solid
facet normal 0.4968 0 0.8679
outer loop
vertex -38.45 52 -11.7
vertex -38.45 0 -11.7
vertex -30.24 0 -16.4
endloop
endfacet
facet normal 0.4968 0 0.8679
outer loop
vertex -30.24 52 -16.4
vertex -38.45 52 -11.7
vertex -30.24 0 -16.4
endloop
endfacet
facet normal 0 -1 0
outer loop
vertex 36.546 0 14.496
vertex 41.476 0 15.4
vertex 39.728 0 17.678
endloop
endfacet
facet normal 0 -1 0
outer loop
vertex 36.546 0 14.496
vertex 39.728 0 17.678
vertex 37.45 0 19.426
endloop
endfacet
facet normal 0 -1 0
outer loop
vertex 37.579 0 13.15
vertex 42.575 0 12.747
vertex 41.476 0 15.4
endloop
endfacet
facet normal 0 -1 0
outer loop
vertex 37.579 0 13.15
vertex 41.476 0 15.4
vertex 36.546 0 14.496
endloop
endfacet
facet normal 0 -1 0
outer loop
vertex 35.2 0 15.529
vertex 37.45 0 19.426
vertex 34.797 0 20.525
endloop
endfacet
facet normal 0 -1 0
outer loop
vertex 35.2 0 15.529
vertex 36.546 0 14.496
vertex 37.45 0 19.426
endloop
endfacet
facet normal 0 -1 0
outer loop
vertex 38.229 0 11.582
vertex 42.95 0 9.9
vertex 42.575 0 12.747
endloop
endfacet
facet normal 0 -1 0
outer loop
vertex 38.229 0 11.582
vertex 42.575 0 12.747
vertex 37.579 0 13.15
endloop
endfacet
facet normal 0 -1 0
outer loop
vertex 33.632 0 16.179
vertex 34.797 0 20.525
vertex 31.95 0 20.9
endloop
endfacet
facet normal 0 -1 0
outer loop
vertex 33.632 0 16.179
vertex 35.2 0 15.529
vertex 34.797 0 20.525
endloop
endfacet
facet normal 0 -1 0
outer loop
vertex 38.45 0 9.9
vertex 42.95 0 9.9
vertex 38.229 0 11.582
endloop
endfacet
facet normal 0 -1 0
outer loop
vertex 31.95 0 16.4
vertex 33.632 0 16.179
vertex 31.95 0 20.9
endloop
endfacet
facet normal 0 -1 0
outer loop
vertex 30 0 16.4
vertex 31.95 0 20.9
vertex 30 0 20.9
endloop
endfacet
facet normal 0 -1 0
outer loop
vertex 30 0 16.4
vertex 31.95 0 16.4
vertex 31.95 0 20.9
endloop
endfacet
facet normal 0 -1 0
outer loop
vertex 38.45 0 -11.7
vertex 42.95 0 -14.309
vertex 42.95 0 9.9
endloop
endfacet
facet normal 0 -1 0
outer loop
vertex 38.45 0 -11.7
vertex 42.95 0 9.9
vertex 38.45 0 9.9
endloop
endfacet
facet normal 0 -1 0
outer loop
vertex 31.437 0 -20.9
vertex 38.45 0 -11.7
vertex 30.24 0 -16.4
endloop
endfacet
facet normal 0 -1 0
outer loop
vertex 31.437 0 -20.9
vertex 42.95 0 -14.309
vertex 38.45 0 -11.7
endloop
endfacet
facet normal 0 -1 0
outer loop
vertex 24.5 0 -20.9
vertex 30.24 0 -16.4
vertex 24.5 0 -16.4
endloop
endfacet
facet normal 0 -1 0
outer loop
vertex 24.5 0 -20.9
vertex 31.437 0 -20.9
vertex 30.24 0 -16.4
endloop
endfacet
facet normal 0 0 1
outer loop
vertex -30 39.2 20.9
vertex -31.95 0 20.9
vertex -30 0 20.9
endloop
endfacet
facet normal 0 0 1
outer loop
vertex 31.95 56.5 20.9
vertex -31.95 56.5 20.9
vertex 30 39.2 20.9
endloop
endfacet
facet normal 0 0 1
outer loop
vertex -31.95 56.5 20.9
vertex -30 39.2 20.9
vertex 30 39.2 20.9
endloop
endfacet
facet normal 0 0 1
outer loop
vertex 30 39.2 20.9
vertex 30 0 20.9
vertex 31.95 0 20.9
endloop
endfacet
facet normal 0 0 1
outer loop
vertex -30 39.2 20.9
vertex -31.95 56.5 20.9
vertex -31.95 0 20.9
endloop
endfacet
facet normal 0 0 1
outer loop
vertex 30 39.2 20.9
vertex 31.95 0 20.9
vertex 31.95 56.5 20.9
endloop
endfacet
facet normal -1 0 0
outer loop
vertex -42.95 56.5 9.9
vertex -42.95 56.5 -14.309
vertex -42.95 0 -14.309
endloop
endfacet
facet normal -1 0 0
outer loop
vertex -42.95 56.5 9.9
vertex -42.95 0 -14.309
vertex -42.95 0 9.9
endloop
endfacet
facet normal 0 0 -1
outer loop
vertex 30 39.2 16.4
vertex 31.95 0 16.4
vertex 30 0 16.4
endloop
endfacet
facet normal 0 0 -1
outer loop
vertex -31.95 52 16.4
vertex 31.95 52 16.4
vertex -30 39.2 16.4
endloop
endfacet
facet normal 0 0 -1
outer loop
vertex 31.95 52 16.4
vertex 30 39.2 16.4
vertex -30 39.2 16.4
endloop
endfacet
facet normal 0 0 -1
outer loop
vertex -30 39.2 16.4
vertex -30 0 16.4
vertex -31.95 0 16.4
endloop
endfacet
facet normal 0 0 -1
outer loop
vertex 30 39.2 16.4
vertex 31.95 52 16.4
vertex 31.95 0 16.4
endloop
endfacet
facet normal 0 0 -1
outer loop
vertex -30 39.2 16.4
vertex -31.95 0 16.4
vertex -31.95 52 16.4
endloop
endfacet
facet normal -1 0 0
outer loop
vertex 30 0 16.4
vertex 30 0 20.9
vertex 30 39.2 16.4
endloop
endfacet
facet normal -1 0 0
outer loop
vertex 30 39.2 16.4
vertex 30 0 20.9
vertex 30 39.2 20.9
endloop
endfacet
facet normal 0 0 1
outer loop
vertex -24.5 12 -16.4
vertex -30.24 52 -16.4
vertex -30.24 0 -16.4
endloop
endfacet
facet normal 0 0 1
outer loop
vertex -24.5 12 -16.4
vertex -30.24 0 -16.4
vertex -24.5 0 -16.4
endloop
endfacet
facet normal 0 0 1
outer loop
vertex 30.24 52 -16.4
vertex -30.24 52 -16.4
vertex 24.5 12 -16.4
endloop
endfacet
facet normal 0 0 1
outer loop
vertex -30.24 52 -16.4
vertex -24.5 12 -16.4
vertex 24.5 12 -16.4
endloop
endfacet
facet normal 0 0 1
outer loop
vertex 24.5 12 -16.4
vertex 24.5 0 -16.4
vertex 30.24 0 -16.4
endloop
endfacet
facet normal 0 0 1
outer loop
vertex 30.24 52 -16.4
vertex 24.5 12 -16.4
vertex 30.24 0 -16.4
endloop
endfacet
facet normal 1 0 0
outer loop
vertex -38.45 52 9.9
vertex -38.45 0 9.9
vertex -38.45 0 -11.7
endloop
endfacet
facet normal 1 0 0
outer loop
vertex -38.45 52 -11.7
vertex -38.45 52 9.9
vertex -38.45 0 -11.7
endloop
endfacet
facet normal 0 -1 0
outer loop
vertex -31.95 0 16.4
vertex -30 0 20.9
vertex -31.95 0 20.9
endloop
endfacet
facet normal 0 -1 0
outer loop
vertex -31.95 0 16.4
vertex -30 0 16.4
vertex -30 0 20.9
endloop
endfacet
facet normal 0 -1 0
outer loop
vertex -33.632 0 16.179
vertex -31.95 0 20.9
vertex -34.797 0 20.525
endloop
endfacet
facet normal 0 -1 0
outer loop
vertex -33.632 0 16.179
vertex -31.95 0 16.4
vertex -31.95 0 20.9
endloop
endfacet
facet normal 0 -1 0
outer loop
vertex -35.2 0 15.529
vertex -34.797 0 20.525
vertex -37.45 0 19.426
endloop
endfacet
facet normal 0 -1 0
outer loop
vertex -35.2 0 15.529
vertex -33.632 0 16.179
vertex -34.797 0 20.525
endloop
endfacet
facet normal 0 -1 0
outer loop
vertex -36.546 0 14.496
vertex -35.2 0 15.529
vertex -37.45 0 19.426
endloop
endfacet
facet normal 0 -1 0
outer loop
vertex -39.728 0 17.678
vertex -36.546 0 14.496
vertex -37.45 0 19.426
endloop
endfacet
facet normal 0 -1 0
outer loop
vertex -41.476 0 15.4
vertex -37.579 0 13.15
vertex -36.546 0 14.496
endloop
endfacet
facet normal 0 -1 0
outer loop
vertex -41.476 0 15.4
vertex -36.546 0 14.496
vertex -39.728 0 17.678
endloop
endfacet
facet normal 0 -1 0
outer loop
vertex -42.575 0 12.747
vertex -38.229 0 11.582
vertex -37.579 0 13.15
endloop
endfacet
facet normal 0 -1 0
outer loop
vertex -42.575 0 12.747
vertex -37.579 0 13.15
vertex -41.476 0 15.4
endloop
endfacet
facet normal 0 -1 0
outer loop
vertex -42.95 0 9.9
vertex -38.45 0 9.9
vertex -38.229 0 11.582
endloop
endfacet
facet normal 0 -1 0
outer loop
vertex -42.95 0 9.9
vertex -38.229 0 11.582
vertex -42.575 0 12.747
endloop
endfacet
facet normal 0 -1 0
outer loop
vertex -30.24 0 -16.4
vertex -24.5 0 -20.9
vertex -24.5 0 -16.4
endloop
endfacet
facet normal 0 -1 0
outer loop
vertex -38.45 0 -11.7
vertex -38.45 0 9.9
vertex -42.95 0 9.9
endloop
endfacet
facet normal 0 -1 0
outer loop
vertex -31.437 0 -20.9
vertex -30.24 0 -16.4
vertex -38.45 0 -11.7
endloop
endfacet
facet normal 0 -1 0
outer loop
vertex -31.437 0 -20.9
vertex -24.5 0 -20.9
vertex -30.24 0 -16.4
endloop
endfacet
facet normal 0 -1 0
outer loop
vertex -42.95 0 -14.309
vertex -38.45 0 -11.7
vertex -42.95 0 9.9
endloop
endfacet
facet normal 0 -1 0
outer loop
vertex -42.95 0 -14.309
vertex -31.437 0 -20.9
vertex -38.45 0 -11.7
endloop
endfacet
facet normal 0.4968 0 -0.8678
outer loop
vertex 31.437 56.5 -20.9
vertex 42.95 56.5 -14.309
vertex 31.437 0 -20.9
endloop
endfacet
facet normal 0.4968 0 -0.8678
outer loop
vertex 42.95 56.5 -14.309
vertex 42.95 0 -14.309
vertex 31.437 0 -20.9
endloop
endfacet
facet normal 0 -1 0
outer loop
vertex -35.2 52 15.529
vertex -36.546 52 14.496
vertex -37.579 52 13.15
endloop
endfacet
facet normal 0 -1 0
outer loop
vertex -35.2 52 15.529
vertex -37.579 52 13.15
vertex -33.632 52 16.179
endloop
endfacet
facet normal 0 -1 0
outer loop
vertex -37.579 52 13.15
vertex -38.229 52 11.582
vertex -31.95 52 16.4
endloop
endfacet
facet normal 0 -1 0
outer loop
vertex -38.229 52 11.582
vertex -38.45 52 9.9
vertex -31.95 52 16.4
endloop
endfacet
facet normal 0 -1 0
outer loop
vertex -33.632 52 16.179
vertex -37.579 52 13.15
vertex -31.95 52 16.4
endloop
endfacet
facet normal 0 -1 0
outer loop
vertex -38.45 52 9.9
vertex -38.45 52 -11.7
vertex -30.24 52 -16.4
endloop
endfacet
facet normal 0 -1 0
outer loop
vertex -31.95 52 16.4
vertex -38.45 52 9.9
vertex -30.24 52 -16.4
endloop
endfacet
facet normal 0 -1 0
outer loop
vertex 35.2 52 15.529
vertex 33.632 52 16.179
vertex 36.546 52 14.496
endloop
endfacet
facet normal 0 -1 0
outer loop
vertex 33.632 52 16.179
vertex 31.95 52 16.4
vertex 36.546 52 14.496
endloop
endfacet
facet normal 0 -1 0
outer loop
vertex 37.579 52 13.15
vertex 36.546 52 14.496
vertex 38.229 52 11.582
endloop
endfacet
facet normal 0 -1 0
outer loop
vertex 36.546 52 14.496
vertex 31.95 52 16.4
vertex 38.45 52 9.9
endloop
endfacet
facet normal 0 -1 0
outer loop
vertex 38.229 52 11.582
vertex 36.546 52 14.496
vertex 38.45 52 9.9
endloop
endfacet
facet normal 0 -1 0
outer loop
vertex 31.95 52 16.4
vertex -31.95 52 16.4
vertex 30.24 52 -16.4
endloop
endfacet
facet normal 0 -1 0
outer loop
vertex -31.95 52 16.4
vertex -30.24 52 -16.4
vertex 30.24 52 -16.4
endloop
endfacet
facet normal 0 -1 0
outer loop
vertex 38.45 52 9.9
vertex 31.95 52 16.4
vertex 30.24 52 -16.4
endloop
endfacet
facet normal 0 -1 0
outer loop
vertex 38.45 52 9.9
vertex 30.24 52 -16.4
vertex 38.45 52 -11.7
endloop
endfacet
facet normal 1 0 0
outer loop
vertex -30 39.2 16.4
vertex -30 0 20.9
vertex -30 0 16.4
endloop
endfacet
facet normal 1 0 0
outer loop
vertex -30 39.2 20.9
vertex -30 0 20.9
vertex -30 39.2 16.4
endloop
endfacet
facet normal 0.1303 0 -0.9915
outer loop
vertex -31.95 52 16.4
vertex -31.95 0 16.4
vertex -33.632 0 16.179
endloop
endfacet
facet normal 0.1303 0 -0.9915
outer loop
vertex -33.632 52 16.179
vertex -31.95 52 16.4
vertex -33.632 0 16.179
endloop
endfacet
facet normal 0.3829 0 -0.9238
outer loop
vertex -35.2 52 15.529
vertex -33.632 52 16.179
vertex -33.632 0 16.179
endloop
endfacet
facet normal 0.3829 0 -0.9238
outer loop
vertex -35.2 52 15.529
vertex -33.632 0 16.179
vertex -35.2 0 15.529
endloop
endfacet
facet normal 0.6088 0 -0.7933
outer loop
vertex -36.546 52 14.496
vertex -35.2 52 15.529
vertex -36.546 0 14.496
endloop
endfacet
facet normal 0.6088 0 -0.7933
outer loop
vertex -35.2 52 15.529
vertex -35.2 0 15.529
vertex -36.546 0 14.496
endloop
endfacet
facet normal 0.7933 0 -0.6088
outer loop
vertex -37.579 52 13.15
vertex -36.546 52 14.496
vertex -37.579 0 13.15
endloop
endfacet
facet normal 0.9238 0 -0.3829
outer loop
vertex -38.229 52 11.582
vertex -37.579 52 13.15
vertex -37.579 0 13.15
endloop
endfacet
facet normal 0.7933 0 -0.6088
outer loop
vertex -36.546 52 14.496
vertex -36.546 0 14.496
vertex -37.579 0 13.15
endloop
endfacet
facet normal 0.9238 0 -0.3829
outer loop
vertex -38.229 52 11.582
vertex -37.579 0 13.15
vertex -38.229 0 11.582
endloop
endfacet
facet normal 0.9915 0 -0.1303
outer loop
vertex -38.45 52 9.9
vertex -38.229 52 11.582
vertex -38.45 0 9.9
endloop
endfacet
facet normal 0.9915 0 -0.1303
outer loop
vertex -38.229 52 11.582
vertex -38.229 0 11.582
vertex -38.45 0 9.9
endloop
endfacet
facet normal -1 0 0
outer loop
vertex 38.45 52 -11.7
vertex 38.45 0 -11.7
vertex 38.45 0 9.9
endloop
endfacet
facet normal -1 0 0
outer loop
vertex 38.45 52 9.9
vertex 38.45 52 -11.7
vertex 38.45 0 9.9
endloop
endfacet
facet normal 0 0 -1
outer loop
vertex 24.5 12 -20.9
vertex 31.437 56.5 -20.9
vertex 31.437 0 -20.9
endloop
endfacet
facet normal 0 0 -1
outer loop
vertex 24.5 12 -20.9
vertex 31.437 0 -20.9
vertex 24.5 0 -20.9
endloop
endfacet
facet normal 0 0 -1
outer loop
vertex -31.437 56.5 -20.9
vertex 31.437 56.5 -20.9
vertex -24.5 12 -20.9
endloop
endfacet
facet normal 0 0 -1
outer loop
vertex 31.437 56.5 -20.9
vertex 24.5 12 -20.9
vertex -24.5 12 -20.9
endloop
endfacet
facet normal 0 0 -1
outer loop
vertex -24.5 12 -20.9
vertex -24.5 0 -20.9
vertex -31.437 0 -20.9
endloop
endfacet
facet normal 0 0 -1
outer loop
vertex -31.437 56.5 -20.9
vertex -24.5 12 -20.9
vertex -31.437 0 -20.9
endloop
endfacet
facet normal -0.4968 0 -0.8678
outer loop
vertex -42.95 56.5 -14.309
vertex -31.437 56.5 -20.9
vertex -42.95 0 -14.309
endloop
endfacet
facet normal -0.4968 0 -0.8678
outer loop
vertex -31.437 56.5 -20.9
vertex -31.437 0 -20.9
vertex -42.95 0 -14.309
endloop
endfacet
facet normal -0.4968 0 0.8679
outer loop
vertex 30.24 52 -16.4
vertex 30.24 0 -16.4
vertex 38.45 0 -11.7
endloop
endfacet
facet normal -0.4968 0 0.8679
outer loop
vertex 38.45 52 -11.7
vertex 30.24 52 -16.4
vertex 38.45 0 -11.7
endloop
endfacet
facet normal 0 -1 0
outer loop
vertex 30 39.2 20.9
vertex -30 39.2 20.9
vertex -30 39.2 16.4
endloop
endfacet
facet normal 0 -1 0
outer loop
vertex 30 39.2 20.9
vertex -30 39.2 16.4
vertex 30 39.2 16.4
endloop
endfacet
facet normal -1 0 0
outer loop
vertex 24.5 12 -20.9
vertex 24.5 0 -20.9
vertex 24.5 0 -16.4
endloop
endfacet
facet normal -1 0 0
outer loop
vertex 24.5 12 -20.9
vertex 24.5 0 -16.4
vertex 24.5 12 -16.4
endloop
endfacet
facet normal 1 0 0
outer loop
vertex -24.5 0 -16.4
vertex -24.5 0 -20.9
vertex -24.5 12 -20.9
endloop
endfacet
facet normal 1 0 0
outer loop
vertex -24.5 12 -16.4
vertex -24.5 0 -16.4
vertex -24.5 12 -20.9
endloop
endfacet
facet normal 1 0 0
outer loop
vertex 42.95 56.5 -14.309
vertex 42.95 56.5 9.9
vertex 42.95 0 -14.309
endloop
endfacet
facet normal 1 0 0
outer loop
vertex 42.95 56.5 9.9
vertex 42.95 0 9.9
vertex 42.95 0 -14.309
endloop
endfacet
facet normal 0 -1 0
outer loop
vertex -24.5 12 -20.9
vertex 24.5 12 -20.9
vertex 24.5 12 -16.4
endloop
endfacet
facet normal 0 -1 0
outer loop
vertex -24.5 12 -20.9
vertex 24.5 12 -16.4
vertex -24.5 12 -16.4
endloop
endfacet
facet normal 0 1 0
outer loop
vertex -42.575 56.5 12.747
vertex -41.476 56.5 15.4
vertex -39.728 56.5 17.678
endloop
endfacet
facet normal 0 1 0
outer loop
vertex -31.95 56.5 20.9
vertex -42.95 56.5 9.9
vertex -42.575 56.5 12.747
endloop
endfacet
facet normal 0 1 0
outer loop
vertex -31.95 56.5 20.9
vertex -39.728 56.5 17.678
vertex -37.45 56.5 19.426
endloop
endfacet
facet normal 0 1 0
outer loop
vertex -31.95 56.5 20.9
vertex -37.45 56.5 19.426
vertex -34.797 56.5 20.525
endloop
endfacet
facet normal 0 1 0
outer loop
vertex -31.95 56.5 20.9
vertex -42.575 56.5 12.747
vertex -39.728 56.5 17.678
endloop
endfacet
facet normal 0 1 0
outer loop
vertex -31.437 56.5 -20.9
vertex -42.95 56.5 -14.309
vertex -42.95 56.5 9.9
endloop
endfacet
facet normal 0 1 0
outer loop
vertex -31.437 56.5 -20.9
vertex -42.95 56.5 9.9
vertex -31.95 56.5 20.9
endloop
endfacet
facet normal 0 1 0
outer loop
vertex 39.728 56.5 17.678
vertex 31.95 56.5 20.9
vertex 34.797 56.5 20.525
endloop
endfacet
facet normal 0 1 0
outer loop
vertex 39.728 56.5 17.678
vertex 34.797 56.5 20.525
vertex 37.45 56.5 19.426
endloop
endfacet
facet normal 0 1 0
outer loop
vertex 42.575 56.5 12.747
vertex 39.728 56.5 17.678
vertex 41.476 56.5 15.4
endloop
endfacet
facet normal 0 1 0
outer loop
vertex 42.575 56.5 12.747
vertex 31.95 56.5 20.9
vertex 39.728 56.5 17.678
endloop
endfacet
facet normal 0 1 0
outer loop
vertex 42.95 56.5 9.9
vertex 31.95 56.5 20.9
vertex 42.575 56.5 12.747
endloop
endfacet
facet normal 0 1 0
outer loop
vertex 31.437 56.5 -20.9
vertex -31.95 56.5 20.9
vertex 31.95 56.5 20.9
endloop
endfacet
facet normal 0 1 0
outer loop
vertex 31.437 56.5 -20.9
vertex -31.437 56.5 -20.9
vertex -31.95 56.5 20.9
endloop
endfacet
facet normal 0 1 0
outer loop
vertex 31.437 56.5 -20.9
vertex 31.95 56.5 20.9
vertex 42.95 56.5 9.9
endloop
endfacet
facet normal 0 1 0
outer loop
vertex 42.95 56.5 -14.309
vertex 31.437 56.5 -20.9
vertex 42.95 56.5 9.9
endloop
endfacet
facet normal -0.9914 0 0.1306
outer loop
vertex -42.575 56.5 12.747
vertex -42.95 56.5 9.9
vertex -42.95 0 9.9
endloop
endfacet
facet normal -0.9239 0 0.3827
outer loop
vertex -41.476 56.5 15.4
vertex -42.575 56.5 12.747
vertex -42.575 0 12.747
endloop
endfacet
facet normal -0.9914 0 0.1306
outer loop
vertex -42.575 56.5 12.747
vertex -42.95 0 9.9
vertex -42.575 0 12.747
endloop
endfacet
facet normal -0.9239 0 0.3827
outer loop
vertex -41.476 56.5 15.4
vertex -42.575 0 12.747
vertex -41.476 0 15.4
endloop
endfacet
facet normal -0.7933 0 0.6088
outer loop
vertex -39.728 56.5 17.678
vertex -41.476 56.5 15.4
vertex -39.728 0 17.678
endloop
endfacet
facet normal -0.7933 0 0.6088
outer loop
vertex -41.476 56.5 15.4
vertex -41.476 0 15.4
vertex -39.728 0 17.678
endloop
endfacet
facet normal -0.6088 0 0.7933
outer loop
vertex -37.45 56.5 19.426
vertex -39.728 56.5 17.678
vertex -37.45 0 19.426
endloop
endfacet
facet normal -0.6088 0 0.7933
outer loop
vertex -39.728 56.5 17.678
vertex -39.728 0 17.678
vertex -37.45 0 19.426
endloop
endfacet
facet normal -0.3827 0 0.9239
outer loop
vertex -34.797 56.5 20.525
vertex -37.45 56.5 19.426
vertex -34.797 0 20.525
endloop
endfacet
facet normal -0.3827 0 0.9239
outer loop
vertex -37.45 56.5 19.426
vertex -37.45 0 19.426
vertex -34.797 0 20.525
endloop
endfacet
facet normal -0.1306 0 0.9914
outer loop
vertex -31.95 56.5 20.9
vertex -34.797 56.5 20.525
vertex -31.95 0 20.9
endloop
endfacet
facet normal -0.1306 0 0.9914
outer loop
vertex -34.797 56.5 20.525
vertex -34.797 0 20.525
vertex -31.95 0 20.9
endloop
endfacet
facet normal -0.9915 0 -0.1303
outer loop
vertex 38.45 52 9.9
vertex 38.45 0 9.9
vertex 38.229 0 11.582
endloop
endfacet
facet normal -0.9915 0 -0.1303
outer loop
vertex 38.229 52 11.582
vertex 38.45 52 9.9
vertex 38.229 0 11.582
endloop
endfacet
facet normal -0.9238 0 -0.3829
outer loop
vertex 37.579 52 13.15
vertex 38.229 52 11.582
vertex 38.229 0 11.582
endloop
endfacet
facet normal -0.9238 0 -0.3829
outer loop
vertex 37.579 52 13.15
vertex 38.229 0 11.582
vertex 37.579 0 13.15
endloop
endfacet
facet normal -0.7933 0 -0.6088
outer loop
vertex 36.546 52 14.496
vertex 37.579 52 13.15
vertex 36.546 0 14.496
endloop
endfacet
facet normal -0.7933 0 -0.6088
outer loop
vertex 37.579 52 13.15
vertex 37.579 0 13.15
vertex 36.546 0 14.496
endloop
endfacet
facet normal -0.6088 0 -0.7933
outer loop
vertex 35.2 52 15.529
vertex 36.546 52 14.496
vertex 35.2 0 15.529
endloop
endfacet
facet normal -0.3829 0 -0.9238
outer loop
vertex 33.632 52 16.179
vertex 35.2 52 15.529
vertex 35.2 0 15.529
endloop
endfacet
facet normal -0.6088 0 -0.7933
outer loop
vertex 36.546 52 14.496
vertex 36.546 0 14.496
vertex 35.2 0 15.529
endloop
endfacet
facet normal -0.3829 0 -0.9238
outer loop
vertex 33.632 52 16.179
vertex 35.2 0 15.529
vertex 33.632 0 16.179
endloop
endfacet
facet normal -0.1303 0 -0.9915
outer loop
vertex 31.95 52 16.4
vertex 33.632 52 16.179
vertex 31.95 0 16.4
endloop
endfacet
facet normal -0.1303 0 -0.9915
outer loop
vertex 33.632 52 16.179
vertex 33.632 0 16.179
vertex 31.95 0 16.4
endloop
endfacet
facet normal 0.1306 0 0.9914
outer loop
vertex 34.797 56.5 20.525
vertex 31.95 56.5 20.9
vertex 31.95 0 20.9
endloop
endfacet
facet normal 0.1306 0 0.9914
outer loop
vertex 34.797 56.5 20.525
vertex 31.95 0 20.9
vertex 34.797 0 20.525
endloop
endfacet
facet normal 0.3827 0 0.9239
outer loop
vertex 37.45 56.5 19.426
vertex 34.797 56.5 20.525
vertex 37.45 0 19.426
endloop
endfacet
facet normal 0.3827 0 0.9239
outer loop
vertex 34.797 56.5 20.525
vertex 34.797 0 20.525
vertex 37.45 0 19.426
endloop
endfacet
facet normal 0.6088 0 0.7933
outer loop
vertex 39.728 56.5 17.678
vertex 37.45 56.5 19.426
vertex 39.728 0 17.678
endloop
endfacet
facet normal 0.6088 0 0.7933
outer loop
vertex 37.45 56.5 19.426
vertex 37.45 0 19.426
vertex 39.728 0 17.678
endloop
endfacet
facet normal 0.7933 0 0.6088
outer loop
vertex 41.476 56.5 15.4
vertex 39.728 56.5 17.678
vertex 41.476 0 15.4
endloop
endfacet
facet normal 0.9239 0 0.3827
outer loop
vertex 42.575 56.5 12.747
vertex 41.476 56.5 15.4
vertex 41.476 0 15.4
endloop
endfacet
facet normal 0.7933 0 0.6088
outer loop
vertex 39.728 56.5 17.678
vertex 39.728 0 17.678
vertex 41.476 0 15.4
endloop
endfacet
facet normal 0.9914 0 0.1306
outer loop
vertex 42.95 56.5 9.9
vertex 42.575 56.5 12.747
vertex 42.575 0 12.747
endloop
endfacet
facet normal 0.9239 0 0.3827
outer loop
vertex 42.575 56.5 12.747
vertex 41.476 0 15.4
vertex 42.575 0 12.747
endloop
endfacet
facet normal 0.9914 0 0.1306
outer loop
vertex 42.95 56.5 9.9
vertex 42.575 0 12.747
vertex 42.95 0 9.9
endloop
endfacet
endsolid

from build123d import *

# Parameters (mm, degrees)
BOSS_EXTRUDE1_DEPTH = 52
BOSS_EXTRUDE2_DEPTH = 4.5
CUT_EXTRUDE1_REACH  = 84.366
SKETCH3_W           = 60
SKETCH3_H           = 39.2
CUT_EXTRUDE2_REACH  = 84.366
SKETCH4_W           = 49
SKETCH4_H           = 12


with BuildPart() as part:
    # Sketch1 → Boss-Extrude1 (new body)
    with BuildSketch(Plane(origin=(0, 0, 0), x_dir=(1, 0, 0), z_dir=(0, 1, 0))):
        with BuildLine():
            Line((-42.95, -9.9), (-42.95, 14.309085823))
            Line((-42.95, 14.309085823), (-31.436935022, 20.9))
            Line((-31.436935022, 20.9), (31.436935022, 20.9))
            Line((31.436935022, 20.9), (42.95, 14.309085823))
            Line((42.95, 14.309085823), (42.95, -9.9))
            ThreePointArc((42.95, -9.9), (39.728174593, -17.678174593), (31.95, -20.9))
            Line((31.95, -20.9), (-31.95, -20.9))
            ThreePointArc((-31.95, -20.9), (-39.728174593, -17.678174593), (-42.95, -9.9))
        make_face()
        with BuildLine():
            Line((-38.45, 11.7), (-30.24, 16.4))
            Line((-30.24, 16.4), (30.24, 16.4))
            Line((30.24, 16.4), (38.45, 11.7))
            Line((38.45, 11.7), (38.45, -9.9))
            ThreePointArc((38.45, -9.9), (36.546194078, -14.496194078), (31.95, -16.4))
            Line((31.95, -16.4), (-31.95, -16.4))
            ThreePointArc((-31.95, -16.4), (-36.546194078, -14.496194078), (-38.45, -9.9))
            Line((-38.45, -9.9), (-38.45, 11.7))
        make_face(mode=Mode.SUBTRACT)
    extrude(amount=BOSS_EXTRUDE1_DEPTH)

    # Sketch2 → Boss-Extrude2 (add)
    with BuildSketch(Plane(origin=(0, 52, 0), x_dir=(1, 0, 0), z_dir=(0, 1, 0))):
        with BuildLine():
            Line((-31.95, -20.9), (31.95, -20.9))
            ThreePointArc((31.95, -20.9), (39.728174593, -17.678174593), (42.95, -9.9))
            Line((42.95, -9.9), (42.95, 14.309085823))
            Line((42.95, 14.309085823), (31.436935022, 20.9))
            Line((31.436935022, 20.9), (-31.436935022, 20.9))
            Line((-31.436935022, 20.9), (-42.95, 14.309085823))
            Line((-42.95, 14.309085823), (-42.95, -9.9))
            ThreePointArc((-42.95, -9.9), (-39.728174593, -17.678174593), (-31.95, -20.9))
        make_face()
    extrude(amount=BOSS_EXTRUDE2_DEPTH)

    # Sketch3 → Cut-Extrude1 (cut, up to next)
    with BuildSketch(Plane.XY.offset(20.9), mode=Mode.PRIVATE) as cut_extrude1_sk1:
        with Locations((0, 19.6)):
            Rectangle(SKETCH3_W, SKETCH3_H)
    cut_extrude1_tool1 = extrude(cut_extrude1_sk1.sketch, amount=-CUT_EXTRUDE1_REACH, mode=Mode.PRIVATE) & part.part
    add(cut_extrude1_tool1.solids().sort_by_distance((0, 19.6, 20.9))[0], mode=Mode.SUBTRACT)

    # Sketch4 → Cut-Extrude2 (cut, up to next)
    with BuildSketch(Plane(origin=(0, 0, -20.9), x_dir=(-1, 0, 0), z_dir=(0, 0, -1)), mode=Mode.PRIVATE) as cut_extrude2_sk1:
        with Locations((0, 6)):
            Rectangle(SKETCH4_W, SKETCH4_H)
    cut_extrude2_tool1 = extrude(cut_extrude2_sk1.sketch, amount=-CUT_EXTRUDE2_REACH, mode=Mode.PRIVATE) & part.part
    add(cut_extrude2_tool1.solids().sort_by_distance((0, 6, -20.9))[0], mode=Mode.SUBTRACT)


solid = part.part
